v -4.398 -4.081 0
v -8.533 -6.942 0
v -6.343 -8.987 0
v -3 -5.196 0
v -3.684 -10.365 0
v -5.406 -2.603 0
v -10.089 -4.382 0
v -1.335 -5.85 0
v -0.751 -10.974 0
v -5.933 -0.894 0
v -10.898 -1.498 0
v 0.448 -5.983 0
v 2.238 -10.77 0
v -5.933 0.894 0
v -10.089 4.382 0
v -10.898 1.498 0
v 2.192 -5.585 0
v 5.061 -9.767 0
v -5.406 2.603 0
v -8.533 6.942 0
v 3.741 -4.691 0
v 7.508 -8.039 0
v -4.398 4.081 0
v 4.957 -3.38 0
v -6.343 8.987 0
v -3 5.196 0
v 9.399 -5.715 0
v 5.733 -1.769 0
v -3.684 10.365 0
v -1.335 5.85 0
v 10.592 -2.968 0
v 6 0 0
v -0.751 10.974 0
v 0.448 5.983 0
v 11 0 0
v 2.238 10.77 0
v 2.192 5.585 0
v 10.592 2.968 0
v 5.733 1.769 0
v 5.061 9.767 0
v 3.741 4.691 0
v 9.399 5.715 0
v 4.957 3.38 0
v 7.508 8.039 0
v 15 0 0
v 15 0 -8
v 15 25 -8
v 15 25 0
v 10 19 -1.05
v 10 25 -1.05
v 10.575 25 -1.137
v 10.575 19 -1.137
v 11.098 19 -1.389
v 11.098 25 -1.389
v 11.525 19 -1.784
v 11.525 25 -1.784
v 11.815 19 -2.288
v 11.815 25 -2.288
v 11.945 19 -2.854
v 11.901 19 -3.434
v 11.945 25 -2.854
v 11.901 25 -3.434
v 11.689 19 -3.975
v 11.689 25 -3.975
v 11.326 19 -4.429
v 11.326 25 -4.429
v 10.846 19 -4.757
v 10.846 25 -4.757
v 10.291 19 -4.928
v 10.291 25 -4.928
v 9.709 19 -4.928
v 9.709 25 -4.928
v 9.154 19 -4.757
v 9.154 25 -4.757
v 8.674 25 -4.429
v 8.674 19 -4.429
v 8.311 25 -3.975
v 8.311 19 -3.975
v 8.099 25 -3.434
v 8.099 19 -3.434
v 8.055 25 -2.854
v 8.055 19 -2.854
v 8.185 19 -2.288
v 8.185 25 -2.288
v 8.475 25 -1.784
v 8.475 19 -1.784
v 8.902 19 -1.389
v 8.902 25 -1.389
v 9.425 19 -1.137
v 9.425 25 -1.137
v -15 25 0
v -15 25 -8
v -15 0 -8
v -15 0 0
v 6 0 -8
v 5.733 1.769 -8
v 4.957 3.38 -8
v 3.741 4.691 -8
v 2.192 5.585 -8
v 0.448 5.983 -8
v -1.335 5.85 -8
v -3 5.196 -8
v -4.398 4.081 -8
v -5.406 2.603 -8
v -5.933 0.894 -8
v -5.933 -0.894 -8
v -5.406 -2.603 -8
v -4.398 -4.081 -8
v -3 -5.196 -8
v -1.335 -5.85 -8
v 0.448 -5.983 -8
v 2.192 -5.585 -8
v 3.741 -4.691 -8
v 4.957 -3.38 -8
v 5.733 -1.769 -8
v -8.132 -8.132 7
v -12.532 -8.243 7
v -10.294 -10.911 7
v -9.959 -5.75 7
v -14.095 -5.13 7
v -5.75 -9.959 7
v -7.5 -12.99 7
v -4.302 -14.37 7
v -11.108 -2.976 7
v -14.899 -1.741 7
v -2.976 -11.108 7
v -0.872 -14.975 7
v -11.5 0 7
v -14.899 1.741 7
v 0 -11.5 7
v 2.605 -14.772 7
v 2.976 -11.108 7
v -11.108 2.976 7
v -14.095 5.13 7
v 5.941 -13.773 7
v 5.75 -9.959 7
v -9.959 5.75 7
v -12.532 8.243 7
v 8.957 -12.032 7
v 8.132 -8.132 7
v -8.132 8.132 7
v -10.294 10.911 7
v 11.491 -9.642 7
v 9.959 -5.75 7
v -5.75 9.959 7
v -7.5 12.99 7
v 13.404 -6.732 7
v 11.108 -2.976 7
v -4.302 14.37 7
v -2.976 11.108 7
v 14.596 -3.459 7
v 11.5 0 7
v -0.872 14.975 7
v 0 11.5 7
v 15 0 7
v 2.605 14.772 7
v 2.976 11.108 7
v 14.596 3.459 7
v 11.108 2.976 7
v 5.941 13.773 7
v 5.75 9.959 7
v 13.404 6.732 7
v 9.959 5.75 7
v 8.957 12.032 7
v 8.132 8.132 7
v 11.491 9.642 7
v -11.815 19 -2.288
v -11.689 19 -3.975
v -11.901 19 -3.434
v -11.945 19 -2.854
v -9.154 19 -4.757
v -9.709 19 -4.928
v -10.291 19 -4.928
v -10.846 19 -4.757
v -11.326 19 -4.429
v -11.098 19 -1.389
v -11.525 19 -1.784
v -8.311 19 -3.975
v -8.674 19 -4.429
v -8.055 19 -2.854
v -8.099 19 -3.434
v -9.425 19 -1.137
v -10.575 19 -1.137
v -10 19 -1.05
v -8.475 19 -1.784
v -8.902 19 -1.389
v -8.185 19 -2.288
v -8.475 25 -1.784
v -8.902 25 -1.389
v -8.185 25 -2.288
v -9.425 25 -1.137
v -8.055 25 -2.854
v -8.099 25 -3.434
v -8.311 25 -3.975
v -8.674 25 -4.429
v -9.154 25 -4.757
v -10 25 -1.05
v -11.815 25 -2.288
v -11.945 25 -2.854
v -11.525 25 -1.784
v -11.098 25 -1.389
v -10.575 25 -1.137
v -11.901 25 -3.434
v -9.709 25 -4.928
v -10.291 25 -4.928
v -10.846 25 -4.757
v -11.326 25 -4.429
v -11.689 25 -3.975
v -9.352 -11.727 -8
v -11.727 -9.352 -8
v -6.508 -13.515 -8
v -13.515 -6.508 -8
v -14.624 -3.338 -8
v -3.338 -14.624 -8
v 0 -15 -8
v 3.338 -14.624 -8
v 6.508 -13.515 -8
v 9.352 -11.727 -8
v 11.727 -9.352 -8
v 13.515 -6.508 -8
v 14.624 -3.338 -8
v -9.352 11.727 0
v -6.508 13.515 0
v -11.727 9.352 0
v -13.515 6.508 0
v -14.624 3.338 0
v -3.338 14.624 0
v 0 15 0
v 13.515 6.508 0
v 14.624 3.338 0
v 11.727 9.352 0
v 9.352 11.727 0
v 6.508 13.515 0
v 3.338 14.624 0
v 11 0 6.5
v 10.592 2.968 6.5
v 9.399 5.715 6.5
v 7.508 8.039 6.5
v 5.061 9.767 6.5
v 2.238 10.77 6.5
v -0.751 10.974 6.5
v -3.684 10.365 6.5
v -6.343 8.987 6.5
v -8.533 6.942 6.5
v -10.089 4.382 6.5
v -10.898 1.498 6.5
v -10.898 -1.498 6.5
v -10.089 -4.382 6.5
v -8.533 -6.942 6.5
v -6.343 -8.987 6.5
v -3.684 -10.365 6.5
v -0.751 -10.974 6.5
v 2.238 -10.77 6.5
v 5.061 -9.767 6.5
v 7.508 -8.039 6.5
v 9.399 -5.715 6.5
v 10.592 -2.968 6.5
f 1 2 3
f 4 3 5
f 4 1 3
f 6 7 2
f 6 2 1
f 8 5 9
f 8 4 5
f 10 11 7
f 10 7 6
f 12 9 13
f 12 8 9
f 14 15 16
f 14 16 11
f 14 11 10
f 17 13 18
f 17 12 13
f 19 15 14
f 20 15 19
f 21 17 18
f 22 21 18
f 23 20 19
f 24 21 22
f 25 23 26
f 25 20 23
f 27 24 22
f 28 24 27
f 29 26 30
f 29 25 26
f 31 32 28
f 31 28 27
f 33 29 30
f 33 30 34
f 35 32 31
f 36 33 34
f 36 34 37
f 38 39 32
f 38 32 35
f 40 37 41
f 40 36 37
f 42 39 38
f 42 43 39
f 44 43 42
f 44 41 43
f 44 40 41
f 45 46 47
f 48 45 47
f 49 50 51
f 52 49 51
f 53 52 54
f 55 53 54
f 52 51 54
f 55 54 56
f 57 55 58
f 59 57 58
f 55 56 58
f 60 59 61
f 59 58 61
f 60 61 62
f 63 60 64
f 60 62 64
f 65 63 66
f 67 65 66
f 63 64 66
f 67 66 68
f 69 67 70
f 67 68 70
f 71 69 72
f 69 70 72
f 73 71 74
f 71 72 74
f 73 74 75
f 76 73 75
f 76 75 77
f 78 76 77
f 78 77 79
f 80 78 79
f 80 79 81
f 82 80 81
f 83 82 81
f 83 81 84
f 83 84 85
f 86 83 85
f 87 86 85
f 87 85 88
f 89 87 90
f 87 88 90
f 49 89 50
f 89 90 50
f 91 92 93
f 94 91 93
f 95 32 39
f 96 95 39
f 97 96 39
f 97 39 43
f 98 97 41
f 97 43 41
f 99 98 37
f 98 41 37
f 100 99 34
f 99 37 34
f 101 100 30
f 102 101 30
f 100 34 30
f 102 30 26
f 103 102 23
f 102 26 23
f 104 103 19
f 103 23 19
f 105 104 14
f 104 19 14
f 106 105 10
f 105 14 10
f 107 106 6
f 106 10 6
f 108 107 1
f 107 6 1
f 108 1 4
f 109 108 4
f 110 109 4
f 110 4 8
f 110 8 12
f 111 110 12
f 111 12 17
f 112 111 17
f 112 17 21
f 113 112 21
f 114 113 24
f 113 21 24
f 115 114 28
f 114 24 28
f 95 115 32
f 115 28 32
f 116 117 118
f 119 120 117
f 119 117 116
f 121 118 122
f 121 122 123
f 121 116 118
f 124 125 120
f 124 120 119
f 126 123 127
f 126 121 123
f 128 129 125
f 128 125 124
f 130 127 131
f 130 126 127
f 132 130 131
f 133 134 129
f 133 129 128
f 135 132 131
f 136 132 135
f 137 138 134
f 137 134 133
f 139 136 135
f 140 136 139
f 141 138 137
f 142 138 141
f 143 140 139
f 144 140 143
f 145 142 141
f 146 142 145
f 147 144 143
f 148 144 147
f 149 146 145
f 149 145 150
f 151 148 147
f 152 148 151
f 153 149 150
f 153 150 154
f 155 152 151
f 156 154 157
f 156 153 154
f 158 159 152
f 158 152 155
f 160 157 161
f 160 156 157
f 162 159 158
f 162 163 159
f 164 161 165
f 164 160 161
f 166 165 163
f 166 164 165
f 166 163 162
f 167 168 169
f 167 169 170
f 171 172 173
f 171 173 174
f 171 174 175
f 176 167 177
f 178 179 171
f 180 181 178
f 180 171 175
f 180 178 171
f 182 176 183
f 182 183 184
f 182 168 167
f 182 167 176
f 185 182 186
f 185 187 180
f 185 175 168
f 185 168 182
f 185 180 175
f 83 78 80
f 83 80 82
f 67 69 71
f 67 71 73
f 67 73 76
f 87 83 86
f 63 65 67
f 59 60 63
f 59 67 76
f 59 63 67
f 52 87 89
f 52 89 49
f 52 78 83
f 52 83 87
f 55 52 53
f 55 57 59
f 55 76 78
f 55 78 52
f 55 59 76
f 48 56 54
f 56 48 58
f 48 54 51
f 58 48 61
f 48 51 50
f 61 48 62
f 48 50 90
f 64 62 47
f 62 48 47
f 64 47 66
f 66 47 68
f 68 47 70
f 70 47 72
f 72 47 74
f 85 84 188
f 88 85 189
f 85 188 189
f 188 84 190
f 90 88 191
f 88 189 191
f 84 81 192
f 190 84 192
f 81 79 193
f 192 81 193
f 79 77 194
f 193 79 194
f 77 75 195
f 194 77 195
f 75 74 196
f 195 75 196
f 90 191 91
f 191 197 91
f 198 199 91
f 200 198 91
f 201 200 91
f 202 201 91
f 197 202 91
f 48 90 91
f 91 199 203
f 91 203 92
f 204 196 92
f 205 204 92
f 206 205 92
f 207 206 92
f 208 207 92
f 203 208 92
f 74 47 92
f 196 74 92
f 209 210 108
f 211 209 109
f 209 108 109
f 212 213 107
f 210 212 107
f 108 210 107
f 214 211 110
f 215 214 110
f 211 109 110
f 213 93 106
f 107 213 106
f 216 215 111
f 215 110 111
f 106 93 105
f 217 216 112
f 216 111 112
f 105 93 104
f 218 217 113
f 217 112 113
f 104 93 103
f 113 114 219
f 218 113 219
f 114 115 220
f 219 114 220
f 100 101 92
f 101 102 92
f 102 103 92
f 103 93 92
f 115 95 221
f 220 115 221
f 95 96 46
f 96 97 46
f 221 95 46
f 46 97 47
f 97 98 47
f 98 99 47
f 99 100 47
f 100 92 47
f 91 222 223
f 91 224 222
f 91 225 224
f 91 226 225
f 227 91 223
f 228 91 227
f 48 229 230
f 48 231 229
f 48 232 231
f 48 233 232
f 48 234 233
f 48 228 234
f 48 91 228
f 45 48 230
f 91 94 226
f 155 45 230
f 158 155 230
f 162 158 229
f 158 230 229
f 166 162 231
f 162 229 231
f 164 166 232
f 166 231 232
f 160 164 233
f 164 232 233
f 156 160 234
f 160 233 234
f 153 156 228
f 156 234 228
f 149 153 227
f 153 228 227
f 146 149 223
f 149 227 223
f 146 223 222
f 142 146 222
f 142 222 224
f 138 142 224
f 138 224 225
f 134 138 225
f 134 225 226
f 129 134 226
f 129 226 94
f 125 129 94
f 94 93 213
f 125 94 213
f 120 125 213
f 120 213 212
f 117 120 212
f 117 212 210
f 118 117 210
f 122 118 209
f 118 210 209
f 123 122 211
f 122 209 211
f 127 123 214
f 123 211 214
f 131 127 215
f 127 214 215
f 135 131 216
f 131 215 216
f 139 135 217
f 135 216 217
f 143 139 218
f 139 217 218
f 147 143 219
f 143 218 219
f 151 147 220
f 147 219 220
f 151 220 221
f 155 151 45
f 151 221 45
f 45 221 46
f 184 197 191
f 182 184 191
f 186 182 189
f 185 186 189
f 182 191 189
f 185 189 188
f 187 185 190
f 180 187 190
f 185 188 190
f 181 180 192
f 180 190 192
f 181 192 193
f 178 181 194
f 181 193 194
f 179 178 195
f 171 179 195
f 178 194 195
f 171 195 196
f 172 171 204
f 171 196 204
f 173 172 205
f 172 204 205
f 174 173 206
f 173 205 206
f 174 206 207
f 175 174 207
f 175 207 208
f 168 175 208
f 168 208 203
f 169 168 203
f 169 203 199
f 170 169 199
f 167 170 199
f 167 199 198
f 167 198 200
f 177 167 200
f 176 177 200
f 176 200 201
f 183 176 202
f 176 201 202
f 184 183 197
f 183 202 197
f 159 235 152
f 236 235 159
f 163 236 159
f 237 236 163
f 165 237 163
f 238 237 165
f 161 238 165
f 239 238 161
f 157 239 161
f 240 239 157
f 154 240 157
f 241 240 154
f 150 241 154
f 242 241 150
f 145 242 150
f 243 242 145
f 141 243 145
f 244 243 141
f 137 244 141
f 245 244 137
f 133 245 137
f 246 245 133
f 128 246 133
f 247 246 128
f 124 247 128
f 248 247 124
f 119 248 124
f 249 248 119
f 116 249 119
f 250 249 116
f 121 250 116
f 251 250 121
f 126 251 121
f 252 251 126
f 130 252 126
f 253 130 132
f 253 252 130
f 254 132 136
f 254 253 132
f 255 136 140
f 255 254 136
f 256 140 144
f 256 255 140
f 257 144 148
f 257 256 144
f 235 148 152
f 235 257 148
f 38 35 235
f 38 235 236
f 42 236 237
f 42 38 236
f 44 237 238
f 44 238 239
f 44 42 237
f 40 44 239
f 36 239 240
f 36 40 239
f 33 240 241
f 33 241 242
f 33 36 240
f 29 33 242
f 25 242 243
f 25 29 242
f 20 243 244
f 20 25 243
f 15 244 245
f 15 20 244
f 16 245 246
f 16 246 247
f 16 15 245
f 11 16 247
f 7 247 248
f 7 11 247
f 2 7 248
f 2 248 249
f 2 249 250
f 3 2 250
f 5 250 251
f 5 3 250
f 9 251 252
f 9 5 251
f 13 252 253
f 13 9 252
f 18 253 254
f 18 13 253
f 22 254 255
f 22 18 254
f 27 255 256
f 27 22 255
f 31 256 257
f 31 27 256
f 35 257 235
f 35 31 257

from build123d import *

# Parameters (mm, degrees)
SKETCH1_R           = 15
SKETCH1_R_2         = 11
BOSS_EXTRUDE1_DEPTH = 7
BOSS_EXTRUDE2_START = 8
BOSS_EXTRUDE2_DEPTH = 8
SKETCH4_R           = 1.95
CUT_EXTRUDE1_DEPTH  = 6
SKETCH5_R           = 6
CUT_EXTRUDE2_DEPTH  = 8
CHAMFER1_SIZE       = 0.5


with BuildPart() as part:
    # Sketch1 → Boss-Extrude1 (new body)
    with BuildSketch(Plane.XY):
        Circle(SKETCH1_R)
        Circle(SKETCH1_R_2, mode=Mode.SUBTRACT)
    extrude(amount=BOSS_EXTRUDE1_DEPTH)

    # Sketch3 → Boss-Extrude2 (add)
    with BuildSketch(Plane(origin=(0, 0, 0), x_dir=(-1, 0, 0), z_dir=(0, 0, -1)).offset(BOSS_EXTRUDE2_START)):
        with BuildLine():
            Line((-15, 0), (-15, 25))
            Line((-15, 25), (15, 25))
            Line((15, 25), (15, 0))
            ThreePointArc((15, 0), (0, -15), (-15, 0))
        make_face()
    extrude(amount=-BOSS_EXTRUDE2_DEPTH)

    # Sketch4 → Cut-Extrude1 (cut)
    with BuildSketch(Plane(origin=(0, 25, 0), x_dir=(1, 0, 0), z_dir=(0, 1, 0))):
        with Locations(Location((-10, 3, 0), (0, 0, 270))):
            Circle(SKETCH4_R)
        with Locations(Location((10, 3, 0), (0, 0, 270))):
            Circle(SKETCH4_R)
    extrude(amount=-CUT_EXTRUDE1_DEPTH, mode=Mode.SUBTRACT)

    # Sketch5 → Cut-Extrude2 (cut)
    with BuildSketch(Plane.XY):
        Circle(SKETCH5_R)
    extrude(amount=-CUT_EXTRUDE2_DEPTH, mode=Mode.SUBTRACT)

    # Chamfer1
    chamfer1_edges = [part.edges().sort_by_distance(p)[0] for p in [
        (-11, 0, 7),
    ]]
    chamfer(chamfer1_edges, length=CHAMFER1_SIZE)


solid = part.part
